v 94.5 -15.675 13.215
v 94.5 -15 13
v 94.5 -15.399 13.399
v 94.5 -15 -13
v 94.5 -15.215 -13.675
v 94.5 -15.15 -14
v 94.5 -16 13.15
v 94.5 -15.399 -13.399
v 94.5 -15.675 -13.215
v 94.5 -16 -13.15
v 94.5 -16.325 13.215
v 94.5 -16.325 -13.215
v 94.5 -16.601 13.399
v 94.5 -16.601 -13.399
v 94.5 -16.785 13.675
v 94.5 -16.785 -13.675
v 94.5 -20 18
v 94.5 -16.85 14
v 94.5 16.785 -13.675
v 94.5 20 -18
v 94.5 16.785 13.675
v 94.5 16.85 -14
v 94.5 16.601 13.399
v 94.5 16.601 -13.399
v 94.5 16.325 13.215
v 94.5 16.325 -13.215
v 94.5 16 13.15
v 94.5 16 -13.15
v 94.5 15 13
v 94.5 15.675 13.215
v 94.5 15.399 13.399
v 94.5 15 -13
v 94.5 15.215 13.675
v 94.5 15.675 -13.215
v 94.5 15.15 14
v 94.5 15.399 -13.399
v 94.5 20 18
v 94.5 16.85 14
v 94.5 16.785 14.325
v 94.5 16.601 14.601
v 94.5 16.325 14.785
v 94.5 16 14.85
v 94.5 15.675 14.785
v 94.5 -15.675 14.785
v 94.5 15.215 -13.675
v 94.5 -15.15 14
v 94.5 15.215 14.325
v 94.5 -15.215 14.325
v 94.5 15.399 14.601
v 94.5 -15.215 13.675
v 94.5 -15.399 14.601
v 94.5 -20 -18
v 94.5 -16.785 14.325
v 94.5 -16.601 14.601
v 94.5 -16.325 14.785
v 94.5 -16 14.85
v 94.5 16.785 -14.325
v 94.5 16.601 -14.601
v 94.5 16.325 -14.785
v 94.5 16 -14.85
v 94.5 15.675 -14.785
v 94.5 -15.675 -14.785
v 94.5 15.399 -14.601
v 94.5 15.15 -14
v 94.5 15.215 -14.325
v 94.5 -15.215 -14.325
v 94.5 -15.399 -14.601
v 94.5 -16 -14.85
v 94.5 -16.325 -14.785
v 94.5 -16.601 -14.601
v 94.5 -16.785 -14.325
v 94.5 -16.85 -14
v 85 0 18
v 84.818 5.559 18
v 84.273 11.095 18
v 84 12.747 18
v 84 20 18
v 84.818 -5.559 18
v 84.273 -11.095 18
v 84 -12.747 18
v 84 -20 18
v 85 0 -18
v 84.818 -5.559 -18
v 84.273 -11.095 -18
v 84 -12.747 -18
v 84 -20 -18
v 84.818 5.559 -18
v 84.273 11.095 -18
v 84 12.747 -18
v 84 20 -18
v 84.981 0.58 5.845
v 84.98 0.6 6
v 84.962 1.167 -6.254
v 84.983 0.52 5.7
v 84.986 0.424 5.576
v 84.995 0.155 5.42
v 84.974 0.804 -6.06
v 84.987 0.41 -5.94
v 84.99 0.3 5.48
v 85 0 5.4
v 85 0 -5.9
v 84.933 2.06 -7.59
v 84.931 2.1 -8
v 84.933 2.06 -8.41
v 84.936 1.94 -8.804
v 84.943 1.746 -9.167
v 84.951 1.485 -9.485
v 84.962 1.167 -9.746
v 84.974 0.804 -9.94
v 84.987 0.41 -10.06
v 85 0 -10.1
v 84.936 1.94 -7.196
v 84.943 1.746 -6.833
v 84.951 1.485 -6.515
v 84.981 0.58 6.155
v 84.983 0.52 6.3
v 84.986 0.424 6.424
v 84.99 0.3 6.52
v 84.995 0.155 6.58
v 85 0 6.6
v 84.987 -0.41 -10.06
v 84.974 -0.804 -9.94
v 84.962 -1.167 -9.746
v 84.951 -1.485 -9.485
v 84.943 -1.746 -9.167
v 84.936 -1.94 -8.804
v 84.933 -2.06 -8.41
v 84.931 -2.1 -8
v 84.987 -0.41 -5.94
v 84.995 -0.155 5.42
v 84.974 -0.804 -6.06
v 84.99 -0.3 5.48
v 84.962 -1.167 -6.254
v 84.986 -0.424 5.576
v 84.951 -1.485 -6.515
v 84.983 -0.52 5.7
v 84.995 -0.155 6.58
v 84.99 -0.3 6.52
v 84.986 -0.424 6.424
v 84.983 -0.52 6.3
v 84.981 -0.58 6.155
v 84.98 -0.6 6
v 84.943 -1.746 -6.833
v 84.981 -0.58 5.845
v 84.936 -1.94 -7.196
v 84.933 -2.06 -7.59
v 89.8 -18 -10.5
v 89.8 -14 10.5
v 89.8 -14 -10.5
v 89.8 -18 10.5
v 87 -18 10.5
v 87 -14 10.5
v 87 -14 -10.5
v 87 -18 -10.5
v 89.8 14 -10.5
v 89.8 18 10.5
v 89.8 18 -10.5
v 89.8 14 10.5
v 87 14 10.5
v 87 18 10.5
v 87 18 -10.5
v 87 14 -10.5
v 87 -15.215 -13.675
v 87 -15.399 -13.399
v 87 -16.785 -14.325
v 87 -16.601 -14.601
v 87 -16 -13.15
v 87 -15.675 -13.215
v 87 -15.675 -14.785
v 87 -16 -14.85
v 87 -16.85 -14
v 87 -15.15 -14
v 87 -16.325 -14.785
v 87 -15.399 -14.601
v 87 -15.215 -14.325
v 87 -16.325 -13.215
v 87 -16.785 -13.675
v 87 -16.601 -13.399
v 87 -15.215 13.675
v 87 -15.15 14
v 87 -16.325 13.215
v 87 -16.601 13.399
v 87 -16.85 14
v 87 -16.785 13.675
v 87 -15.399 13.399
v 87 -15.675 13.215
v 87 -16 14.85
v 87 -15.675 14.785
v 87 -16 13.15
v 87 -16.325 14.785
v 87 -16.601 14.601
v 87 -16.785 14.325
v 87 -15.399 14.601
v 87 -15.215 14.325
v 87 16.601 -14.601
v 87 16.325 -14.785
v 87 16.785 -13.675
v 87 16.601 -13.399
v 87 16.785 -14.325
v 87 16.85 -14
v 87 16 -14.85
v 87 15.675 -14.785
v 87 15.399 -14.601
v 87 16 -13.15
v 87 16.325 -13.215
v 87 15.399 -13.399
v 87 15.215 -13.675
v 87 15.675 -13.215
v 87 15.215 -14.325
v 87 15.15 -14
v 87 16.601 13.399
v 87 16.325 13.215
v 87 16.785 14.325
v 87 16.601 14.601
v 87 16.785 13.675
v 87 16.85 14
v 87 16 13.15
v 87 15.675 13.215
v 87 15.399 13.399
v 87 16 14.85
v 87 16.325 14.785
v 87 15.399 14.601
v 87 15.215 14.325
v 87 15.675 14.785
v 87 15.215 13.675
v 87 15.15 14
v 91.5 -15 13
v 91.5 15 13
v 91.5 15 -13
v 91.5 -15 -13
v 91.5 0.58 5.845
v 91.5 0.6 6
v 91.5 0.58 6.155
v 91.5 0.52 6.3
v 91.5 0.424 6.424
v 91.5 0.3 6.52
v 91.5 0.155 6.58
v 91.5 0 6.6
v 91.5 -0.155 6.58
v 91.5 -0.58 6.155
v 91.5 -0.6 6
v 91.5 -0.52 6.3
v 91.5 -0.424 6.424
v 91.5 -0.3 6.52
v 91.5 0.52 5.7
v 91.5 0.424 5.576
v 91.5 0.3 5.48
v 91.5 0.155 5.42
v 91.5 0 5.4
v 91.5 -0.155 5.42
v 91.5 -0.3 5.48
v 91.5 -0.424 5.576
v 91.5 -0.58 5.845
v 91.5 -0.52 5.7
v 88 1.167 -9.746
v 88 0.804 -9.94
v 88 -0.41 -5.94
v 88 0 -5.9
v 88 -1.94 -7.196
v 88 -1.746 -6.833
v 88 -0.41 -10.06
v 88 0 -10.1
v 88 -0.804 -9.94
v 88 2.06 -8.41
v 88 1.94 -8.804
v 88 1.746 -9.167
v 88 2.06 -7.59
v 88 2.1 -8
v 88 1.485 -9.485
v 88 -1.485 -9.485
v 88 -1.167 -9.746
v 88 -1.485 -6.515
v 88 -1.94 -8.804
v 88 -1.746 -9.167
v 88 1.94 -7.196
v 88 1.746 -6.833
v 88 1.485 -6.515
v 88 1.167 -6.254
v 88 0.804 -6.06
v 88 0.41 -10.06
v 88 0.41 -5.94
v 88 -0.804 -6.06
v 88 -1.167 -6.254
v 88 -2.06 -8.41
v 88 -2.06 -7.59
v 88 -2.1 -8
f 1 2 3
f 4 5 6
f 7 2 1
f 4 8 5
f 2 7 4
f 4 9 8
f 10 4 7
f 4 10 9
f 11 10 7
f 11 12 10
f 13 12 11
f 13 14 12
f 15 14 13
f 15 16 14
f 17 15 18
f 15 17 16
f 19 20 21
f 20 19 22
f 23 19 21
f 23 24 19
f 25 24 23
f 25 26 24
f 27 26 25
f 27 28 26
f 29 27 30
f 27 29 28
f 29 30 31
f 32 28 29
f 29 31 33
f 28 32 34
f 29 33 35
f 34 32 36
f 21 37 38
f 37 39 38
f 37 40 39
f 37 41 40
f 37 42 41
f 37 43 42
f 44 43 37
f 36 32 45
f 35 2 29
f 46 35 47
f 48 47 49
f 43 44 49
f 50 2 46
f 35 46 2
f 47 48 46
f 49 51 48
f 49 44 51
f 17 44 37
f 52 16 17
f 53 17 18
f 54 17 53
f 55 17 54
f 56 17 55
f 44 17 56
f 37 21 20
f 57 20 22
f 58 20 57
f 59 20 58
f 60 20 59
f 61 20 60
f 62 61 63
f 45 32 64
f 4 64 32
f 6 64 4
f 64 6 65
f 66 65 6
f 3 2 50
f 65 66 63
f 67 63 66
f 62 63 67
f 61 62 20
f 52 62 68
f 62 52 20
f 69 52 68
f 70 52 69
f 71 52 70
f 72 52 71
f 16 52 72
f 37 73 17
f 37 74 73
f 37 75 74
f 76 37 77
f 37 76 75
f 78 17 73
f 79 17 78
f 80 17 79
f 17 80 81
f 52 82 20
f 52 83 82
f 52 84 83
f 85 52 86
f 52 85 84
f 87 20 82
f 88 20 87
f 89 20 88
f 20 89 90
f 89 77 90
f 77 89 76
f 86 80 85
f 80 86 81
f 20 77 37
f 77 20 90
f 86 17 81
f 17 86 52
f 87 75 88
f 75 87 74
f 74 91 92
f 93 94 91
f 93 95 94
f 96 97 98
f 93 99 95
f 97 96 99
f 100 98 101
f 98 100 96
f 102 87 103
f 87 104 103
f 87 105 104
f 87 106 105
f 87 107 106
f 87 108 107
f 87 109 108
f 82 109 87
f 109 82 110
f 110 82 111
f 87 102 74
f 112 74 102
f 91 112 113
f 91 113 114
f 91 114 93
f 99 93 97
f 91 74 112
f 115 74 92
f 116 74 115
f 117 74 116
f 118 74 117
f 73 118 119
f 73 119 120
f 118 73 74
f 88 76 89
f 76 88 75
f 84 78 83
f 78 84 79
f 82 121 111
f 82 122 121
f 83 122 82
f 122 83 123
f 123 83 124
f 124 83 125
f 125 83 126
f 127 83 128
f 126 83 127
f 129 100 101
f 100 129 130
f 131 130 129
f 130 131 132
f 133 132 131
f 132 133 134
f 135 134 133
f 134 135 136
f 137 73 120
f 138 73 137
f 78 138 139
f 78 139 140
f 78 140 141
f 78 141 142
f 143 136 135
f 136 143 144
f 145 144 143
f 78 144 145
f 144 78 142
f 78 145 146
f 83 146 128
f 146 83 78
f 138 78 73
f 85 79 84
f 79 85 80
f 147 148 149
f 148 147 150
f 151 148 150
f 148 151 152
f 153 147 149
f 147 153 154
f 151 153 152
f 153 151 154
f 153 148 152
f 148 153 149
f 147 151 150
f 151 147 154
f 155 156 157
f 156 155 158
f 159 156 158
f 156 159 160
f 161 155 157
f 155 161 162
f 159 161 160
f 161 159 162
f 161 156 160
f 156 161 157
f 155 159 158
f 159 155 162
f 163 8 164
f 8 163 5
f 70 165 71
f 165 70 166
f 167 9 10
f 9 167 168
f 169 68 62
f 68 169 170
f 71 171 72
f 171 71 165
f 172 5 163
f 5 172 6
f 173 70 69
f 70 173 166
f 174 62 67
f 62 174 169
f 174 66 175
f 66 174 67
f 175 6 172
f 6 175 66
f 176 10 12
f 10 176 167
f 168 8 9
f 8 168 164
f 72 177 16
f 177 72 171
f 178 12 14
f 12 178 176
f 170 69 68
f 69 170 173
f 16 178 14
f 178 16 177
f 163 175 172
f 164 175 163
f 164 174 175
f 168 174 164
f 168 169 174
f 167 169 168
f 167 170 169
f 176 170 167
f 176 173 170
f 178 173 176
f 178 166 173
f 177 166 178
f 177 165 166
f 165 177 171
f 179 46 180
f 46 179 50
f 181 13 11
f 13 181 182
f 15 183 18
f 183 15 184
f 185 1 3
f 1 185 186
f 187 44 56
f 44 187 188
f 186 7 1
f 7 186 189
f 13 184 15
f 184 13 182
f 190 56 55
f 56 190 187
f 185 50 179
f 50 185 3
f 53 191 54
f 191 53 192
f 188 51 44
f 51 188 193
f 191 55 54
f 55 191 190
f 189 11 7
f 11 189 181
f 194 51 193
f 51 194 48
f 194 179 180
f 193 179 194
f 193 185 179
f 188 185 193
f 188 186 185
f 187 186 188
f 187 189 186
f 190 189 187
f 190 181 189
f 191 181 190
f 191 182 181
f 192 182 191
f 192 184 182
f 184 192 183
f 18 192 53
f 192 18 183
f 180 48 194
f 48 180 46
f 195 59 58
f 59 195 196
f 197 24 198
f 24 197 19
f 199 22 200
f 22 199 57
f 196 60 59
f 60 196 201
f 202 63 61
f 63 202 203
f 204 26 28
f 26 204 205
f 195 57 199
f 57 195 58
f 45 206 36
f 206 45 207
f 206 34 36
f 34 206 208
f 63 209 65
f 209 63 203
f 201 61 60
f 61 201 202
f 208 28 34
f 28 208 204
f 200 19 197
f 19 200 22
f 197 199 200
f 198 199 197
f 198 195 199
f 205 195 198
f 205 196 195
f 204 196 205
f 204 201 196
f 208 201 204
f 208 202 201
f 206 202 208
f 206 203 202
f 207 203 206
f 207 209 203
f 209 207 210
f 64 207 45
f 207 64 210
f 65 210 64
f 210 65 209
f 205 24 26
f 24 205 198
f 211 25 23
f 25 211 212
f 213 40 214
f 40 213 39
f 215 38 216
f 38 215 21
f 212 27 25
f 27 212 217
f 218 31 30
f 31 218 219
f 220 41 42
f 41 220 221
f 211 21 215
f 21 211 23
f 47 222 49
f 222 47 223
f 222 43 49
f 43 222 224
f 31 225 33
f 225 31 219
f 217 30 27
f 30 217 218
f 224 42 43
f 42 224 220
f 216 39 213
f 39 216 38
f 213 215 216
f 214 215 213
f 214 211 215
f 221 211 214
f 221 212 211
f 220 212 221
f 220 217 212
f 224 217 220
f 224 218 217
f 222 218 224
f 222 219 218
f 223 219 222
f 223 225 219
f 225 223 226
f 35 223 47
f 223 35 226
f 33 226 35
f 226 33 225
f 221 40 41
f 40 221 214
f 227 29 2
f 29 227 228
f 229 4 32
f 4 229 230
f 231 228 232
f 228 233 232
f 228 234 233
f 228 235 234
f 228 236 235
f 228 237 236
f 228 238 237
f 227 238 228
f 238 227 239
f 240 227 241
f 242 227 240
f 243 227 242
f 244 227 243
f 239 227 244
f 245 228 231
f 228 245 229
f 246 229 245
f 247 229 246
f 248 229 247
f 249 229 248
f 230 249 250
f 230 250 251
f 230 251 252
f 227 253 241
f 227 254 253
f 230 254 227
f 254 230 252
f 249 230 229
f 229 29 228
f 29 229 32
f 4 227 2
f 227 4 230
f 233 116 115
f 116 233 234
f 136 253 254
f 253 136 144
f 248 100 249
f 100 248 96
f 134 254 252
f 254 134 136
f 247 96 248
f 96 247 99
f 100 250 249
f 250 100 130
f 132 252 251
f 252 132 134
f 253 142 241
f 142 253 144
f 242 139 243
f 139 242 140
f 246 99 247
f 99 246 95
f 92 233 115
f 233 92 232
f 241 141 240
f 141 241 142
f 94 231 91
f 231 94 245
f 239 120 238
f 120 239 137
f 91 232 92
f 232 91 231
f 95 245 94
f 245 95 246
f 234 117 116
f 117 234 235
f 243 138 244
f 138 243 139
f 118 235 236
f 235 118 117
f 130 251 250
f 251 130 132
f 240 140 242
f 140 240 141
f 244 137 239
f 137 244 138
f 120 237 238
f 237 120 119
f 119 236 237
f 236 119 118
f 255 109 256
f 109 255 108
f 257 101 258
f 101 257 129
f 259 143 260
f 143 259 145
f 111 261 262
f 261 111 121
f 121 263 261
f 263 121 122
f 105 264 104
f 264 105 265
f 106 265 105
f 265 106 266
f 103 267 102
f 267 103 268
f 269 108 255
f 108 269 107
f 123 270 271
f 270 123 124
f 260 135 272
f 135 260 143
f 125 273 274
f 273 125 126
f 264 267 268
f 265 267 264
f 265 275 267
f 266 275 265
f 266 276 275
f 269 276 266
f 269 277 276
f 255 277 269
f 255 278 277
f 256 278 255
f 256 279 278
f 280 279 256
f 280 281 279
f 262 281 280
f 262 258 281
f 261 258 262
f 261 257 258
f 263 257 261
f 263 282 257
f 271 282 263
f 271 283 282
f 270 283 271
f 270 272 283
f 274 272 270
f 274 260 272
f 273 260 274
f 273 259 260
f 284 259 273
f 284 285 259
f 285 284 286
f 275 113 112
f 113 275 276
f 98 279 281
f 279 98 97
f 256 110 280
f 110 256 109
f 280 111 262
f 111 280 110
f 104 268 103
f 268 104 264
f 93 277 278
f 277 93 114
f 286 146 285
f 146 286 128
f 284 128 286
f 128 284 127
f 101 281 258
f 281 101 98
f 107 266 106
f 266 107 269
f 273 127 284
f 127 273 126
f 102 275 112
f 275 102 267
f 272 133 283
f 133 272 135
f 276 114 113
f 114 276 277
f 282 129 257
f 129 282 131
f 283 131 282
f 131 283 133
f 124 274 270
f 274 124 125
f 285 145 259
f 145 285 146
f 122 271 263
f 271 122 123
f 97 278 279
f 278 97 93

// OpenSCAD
// file: phytohydra_params.scad
// PhytoHydra v1 - shared parameters (all dimensions in mm)
// Open any part file in OpenSCAD (free, openscad.org), press F6, then File > Export > STL.
trunk_d      = 170;   // measure girth with a tape: trunk_d = girth / 3.1416
trunk_r      = trunk_d / 2;
wall         = 2.4;   // printed wall thickness (PA12, ASA or PETG)
strap_w      = 20;    // TPU strap / stainless band width
strap_t      = 2.2;
$fn          = 96;
// main file
// Electrode pod base: curved saddle that conforms to the trunk,
// pocket for the pod PCB, through-hole for the Ti micro-pin, PT1000 pocket, strap slots.
include <phytohydra_params.scad>;
pod_w   = 40;   // tangential width
pod_h   = 36;   // height along trunk
base_t  = 9.5;  // thickness at centreline
pin_d   = 1.2;  // Ti micro-pin clearance hole (pin is 1.0 mm)
pin_z   = 6;    // pin offset above pod centre
pt_d    = 4.2;  // PT1000 button pocket
pt_z    = -8;
pcb_w   = 30; pcb_h = 26; pcb_t = 3.0;   // PCB pocket on outer face

module saddle() {
    // slab bounded by the trunk cylinder on the inside
    difference() {
        translate([trunk_r - 1, -pod_w/2, -pod_h/2]) cube([base_t + 1, pod_w, pod_h]);
        cylinder(r = trunk_r, h = pod_h + 2, center = true);
    }
}
difference() {
    saddle();
    // PCB pocket on the outer face
    translate([trunk_r + base_t - pcb_t, -pcb_w/2, -pcb_h/2]) cube([pcb_t + 1, pcb_w, pcb_h]);
    // micro-pin through hole (radial)
    translate([trunk_r - 2, 0, pin_z]) rotate([0, 90, 0]) cylinder(d = pin_d, h = base_t + 4, $fn = 24);
    // PT1000 pocket open to the trunk side
    translate([trunk_r - 2, 0, pt_z]) rotate([0, 90, 0]) cylinder(d = pt_d, h = 5, $fn = 32);
    // strap slots through the base, tangential
    for (s = [-1, 1])
        translate([trunk_r + 2, s * (pod_w/2 - 4) - 2, -strap_w/2 - 0.5]) cube([strap_t + 0.6, 4, strap_w + 1]);
    // 4 x M2 screw holes for the cover
    for (y = [-pod_w/2 + 4, pod_w/2 - 4], z = [-pod_h/2 + 4, pod_h/2 - 4])
        translate([trunk_r + 2, y, z]) rotate([0, 90, 0]) cylinder(d = 1.7, h = base_t + 2, $fn = 16);
}
